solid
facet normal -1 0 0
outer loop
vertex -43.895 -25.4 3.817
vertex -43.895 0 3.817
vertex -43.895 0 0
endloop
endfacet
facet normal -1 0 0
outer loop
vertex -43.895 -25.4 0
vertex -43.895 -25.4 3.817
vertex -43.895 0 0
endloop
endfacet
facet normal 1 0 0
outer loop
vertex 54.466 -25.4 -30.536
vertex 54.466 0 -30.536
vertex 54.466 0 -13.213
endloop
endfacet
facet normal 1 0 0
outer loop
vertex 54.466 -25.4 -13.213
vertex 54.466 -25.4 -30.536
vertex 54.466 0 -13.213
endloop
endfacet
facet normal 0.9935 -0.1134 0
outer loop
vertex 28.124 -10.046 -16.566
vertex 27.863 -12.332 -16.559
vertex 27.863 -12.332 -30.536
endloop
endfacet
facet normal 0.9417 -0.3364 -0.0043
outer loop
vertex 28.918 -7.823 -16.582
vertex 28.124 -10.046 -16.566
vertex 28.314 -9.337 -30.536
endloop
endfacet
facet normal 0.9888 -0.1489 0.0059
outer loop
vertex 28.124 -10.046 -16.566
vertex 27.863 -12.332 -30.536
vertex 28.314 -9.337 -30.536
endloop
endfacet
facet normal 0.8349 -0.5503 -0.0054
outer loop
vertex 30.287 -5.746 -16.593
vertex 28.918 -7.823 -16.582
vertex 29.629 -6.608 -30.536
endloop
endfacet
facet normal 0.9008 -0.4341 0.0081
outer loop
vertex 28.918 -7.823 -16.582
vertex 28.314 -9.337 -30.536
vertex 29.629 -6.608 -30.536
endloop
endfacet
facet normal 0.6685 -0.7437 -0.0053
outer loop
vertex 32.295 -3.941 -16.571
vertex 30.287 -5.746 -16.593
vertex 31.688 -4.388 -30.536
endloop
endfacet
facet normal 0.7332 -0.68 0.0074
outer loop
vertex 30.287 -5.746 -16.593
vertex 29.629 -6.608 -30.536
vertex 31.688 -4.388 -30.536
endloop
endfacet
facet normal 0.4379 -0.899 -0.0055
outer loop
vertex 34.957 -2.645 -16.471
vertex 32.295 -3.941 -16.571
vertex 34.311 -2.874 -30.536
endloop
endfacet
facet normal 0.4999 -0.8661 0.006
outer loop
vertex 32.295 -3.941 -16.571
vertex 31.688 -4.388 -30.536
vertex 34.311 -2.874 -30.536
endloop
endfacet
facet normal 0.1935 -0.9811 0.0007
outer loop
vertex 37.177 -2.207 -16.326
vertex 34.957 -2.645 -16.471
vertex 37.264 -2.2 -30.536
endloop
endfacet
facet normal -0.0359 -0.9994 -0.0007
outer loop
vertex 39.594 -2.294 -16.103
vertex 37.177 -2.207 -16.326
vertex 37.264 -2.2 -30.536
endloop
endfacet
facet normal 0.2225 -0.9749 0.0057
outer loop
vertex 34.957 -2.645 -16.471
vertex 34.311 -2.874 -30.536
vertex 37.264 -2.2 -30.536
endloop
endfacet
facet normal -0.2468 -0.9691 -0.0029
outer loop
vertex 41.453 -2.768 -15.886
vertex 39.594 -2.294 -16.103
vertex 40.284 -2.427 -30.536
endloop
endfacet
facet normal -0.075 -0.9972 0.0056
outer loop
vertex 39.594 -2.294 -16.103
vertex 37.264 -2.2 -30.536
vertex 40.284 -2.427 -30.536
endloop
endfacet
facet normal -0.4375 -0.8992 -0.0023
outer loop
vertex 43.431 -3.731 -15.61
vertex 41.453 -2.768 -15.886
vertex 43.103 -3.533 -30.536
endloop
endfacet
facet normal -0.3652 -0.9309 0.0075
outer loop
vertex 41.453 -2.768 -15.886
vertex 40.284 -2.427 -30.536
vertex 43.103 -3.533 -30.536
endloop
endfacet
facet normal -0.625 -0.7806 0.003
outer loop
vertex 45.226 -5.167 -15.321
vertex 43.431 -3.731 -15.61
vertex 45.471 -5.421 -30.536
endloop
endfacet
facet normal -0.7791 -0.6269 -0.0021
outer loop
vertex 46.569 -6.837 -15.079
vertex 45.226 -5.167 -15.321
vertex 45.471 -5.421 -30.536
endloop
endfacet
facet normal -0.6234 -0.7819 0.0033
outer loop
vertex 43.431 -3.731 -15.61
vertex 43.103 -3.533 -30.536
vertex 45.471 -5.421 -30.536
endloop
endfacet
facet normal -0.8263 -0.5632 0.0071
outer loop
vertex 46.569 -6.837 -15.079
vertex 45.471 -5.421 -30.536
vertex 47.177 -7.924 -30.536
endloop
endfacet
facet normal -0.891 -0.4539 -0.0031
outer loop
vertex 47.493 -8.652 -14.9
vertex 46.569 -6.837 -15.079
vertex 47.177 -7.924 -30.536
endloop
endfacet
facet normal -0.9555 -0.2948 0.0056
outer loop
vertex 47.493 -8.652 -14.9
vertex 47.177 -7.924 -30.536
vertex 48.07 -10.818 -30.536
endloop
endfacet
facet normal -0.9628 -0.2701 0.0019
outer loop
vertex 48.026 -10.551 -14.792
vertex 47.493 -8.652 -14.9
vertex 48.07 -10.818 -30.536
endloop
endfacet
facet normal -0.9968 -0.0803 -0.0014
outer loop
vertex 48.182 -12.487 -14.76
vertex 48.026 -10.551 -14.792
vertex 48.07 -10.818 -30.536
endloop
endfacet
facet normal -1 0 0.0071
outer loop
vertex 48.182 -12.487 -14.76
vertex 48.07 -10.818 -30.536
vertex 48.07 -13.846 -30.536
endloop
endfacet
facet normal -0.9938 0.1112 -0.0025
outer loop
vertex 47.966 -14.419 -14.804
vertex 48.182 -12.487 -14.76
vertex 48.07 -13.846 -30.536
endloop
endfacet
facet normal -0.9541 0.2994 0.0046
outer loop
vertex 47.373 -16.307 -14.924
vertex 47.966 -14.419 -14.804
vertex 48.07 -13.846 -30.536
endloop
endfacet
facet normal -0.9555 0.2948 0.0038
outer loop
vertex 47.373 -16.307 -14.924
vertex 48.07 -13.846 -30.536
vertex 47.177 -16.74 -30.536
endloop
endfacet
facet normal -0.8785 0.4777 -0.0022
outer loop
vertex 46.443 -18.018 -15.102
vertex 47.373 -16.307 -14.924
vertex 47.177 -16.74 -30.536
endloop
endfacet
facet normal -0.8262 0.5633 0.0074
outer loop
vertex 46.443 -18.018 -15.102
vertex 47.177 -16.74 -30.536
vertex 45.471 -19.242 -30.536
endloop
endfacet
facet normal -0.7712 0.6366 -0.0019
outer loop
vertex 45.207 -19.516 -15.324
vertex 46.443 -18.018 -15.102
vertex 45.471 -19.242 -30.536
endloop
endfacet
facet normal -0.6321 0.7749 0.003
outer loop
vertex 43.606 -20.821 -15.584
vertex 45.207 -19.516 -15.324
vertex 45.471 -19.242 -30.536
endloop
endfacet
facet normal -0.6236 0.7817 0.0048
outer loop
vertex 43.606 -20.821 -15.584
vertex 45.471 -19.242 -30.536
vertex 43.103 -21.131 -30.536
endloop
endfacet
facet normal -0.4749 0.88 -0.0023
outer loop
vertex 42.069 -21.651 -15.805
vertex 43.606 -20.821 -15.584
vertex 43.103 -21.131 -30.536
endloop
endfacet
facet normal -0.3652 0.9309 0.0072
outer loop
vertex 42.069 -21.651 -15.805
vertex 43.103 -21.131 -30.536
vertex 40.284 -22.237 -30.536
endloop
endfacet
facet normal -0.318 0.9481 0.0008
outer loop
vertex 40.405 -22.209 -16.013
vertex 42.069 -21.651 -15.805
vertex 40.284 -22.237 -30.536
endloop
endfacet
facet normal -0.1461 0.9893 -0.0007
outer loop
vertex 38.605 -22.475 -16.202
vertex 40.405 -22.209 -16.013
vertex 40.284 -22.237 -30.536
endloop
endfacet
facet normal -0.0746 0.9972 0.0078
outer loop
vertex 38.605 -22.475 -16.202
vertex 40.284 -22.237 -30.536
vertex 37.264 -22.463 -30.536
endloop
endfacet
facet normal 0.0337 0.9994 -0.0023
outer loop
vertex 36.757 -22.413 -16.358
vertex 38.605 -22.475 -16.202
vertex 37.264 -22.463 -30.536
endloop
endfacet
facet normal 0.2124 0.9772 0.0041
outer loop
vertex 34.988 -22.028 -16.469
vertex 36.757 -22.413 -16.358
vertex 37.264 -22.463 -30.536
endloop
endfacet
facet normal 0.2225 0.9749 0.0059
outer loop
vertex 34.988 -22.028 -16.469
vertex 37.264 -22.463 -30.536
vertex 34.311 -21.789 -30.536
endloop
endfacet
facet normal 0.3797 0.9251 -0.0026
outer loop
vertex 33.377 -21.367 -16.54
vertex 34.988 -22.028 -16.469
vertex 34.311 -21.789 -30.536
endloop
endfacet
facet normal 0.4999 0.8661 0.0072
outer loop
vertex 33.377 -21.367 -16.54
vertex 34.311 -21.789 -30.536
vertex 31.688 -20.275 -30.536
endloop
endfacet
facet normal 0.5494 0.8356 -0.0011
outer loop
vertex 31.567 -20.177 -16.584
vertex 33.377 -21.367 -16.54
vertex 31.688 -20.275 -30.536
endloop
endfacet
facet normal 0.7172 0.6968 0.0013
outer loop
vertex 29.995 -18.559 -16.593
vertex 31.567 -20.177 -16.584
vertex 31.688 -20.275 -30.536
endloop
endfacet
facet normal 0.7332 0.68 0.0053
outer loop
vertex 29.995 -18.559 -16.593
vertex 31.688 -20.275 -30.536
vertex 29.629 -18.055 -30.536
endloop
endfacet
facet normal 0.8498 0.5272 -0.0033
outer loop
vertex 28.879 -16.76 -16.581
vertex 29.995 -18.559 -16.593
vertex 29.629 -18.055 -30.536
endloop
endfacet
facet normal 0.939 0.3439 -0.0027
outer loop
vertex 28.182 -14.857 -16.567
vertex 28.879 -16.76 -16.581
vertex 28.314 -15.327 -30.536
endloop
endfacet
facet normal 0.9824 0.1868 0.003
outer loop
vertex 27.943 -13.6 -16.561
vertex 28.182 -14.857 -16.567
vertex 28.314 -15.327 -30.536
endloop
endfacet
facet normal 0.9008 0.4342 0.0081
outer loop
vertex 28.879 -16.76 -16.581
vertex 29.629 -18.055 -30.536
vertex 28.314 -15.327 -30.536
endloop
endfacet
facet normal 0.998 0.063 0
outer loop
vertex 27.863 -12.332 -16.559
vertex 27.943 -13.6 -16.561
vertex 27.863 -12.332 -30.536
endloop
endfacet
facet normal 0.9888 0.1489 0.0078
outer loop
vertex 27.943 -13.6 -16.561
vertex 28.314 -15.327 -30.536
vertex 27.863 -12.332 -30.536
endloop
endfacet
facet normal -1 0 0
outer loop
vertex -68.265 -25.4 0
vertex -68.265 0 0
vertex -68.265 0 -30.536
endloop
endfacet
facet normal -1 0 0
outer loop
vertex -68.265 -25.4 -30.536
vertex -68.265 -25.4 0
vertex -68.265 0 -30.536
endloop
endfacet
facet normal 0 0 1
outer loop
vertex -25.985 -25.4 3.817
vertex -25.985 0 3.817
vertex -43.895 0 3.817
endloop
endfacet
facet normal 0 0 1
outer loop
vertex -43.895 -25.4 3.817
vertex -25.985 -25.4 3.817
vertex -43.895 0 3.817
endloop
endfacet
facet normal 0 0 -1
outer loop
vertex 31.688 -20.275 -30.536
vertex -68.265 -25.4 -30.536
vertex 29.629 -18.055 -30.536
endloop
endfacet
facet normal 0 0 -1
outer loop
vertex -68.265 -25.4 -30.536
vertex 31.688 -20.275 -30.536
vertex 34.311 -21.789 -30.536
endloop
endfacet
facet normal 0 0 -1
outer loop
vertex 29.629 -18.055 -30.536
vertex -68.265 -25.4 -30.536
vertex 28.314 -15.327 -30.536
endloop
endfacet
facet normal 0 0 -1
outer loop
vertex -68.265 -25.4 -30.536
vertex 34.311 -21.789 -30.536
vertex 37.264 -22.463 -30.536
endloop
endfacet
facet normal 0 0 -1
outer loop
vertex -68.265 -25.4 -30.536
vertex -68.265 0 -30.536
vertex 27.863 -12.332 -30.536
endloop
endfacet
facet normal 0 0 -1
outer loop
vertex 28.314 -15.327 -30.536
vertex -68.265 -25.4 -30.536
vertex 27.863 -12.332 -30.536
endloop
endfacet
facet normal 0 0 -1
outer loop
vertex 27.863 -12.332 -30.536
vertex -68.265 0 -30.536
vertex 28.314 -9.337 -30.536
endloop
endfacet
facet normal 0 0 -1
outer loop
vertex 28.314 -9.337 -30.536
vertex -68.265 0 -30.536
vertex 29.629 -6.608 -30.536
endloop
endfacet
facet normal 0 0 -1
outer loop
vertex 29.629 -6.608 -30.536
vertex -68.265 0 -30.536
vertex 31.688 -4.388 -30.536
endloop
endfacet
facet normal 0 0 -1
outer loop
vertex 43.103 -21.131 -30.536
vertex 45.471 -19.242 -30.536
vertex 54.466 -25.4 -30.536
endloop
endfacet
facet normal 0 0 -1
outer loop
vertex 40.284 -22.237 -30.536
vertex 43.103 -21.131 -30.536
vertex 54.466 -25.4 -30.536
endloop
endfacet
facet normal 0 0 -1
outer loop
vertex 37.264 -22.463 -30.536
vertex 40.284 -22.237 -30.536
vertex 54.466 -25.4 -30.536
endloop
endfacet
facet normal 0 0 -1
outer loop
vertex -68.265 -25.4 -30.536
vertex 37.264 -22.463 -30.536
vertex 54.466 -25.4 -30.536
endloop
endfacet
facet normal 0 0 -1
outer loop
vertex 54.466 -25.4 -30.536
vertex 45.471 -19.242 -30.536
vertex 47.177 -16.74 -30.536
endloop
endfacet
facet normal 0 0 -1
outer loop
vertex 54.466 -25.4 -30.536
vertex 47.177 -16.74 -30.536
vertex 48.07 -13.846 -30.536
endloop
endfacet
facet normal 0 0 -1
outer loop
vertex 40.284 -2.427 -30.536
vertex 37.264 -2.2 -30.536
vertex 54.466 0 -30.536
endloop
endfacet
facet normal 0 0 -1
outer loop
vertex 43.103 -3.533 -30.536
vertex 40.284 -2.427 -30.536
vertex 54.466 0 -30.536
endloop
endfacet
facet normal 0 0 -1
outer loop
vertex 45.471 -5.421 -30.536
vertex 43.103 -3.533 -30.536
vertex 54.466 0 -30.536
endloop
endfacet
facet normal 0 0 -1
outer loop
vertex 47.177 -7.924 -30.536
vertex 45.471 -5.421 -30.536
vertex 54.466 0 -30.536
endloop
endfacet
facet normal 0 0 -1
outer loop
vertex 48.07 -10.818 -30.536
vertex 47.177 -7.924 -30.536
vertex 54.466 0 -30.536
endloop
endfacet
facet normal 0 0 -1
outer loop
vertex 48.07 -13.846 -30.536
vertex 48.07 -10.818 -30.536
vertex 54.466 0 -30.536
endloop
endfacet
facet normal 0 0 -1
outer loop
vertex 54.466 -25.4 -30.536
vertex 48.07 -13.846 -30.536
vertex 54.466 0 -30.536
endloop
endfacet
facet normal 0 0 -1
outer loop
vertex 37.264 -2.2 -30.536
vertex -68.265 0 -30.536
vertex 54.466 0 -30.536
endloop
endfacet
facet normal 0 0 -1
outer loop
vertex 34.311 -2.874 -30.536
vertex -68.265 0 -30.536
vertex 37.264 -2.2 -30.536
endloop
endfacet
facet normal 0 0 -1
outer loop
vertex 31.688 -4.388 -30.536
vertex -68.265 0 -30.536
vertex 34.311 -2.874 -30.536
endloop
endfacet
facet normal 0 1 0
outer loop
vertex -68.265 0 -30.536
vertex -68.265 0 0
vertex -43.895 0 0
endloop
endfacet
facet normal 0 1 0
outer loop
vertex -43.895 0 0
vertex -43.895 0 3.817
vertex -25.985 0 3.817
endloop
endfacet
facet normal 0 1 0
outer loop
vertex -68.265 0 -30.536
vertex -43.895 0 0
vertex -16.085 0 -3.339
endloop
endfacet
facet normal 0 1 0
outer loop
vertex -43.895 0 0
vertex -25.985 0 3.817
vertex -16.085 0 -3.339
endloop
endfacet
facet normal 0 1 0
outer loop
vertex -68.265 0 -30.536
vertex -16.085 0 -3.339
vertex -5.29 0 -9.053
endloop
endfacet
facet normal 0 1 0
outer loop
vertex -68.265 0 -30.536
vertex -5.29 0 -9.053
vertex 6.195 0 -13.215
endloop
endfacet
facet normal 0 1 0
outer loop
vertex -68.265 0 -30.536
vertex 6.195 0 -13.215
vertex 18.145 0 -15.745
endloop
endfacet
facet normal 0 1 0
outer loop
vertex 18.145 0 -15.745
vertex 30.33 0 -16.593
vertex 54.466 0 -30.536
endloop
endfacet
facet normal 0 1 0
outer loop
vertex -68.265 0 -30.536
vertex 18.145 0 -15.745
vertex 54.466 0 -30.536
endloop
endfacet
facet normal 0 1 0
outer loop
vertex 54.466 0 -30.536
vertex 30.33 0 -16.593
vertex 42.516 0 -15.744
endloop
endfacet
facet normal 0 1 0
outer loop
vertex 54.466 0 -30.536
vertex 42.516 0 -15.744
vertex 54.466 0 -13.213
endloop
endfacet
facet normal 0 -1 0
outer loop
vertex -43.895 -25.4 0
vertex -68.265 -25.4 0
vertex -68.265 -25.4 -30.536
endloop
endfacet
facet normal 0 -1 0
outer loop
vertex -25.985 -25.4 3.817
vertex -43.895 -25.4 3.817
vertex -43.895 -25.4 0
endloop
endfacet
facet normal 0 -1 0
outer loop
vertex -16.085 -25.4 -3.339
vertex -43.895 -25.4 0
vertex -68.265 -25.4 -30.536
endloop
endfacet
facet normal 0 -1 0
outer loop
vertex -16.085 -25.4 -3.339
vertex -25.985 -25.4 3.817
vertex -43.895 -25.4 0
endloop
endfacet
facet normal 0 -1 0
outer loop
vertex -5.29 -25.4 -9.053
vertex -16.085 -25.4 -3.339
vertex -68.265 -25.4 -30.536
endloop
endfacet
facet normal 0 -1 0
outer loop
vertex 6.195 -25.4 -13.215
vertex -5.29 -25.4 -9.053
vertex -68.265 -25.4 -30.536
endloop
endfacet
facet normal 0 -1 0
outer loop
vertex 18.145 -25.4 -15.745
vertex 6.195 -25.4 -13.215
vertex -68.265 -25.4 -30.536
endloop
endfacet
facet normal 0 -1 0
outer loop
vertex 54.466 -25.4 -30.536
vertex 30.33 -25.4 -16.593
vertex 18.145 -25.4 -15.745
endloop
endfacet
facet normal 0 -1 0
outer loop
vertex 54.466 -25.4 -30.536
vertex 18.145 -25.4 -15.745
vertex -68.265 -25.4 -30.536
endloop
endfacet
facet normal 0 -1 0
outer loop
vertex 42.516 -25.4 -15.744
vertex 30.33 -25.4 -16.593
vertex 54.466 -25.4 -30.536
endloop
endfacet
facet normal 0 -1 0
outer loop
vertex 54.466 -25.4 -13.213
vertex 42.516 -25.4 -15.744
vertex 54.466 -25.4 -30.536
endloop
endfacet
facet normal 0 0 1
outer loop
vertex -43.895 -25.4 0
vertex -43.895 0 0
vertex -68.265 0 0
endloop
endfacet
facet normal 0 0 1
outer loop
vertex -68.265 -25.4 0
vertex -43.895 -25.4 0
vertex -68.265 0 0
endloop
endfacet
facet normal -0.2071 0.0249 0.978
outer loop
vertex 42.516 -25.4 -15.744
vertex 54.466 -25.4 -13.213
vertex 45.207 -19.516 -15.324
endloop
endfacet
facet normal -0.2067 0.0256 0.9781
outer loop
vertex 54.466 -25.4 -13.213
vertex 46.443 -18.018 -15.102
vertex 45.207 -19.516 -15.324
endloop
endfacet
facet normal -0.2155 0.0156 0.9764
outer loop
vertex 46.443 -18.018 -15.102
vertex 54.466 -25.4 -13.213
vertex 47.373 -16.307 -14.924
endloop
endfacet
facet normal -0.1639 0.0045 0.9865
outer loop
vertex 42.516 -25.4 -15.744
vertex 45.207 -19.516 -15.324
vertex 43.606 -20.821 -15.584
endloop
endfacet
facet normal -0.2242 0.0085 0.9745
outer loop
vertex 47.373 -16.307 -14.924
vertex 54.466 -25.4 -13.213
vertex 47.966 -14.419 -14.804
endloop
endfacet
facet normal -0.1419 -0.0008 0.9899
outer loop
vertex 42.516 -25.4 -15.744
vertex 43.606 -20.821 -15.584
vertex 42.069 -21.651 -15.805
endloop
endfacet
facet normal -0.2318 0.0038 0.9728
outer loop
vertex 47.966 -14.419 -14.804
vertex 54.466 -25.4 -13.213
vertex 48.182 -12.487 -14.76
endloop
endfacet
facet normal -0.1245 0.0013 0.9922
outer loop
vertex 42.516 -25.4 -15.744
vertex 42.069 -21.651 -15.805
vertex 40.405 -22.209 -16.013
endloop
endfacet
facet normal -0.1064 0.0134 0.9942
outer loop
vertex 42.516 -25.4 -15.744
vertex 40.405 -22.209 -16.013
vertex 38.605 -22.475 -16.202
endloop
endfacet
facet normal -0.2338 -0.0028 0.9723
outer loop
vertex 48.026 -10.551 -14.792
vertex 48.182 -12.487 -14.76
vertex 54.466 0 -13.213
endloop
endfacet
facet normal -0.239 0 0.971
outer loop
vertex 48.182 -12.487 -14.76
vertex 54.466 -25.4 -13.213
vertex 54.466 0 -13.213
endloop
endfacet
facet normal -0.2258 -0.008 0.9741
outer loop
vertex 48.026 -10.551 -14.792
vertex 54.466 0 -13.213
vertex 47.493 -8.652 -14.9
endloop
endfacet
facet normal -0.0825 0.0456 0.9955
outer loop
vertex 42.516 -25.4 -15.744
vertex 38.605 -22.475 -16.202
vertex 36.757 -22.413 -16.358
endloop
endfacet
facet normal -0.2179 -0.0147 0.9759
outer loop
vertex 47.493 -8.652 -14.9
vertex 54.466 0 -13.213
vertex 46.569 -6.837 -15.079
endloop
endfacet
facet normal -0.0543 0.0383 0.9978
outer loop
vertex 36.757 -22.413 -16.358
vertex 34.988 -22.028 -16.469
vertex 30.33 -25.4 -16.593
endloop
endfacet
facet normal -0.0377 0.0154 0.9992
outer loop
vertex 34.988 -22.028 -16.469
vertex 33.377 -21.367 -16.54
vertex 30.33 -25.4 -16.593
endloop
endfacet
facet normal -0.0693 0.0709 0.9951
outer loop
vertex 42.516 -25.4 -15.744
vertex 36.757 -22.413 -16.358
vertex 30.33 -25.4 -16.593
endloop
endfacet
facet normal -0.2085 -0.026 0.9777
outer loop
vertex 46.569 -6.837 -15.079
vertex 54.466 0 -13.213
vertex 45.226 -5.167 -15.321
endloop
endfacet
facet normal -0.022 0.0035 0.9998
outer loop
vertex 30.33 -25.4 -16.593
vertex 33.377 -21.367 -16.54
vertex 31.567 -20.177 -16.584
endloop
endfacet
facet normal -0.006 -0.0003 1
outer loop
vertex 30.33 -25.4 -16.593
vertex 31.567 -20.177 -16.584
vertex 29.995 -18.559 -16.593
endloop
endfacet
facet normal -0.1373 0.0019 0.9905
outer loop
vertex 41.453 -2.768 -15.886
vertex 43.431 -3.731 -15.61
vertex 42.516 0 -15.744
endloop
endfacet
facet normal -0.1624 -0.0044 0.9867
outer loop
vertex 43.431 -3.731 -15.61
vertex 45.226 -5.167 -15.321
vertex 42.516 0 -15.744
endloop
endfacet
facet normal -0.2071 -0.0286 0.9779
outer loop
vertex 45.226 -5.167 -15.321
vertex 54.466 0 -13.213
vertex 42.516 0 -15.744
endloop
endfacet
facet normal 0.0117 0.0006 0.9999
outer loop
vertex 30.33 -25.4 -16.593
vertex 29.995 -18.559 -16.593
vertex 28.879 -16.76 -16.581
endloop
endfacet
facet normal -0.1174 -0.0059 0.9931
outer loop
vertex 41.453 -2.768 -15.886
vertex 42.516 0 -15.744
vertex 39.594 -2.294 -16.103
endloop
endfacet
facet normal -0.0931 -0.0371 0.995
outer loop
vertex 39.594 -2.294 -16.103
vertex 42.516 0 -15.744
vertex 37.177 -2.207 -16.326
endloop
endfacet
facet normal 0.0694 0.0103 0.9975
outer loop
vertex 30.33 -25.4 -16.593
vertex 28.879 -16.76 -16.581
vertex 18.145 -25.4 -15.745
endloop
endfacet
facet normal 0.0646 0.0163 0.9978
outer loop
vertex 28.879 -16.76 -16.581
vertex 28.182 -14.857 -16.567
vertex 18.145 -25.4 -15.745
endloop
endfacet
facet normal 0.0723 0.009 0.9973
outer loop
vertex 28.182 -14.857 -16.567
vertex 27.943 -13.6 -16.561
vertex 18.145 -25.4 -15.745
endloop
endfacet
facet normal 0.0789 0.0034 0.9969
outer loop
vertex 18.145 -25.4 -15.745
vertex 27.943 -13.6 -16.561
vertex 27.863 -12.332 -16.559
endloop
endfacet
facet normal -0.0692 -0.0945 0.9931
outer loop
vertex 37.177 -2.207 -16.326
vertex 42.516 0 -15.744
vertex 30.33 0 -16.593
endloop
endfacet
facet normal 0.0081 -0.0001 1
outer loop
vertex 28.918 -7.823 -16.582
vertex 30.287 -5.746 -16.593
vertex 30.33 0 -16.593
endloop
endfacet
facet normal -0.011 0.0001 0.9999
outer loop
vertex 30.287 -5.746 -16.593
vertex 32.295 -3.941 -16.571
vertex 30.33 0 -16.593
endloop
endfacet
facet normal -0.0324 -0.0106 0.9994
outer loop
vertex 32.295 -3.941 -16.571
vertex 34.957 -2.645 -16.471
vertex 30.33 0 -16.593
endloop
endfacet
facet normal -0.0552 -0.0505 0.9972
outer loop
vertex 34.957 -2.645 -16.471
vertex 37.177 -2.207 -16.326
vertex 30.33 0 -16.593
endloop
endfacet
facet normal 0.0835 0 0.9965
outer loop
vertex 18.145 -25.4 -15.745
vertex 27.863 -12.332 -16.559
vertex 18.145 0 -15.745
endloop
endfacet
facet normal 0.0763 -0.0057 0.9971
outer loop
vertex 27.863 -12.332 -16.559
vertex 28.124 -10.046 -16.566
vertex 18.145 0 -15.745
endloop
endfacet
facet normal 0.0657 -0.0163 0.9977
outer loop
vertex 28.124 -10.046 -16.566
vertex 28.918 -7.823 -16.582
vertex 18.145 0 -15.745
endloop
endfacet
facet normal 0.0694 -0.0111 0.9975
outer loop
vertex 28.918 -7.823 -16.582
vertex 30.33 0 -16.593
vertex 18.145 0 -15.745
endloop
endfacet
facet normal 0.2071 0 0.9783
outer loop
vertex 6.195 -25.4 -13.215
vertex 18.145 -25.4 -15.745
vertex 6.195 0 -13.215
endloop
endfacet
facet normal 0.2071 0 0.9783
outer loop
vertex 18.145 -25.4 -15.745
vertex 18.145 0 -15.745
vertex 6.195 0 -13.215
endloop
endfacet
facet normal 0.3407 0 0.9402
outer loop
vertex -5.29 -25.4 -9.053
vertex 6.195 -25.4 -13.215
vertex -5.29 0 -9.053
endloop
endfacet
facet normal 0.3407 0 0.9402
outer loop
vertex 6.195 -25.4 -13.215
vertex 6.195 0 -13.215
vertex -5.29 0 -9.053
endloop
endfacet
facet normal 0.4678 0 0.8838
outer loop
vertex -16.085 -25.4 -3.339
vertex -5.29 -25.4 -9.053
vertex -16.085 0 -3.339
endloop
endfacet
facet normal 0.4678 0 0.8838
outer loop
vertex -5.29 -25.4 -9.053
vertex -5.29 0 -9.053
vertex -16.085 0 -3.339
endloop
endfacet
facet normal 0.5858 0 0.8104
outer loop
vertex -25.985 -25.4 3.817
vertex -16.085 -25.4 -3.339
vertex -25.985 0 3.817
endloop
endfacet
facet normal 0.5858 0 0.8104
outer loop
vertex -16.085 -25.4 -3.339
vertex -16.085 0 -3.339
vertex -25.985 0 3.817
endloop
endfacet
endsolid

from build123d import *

# Parameters (mm, degrees)
F1_DEPTH = 25.4
F3_D     = 20.32


with BuildPart() as f1:
    # F0 (on Front) → F1 (new body)
    with BuildSketch(Plane.XZ):
        with BuildLine():
            Line((-68.265416, 0), (-68.265416, -30.535927))
            Line((-68.265416, -30.535927), (54.465521, -30.535927))
            Line((54.465521, -30.535927), (54.465521, -13.212661))
            ThreePointArc((54.465521, -13.212661), (12.125602, -14.688008), (-25.9849, 3.816991))
            Line((-25.9849, 3.816991), (-43.895394, 3.816991))
            Line((-43.895394, 3.816991), (-43.895394, 0))
            Line((-43.895394, 0), (-68.265416, 0))
        make_face()
    extrude(amount=F1_DEPTH)

    # F3 (through all)
    with Locations(Plane.XY):
        with Locations((38.023103, -12.331817)):
            Hole(F3_D / 2)


solid = f1.part
